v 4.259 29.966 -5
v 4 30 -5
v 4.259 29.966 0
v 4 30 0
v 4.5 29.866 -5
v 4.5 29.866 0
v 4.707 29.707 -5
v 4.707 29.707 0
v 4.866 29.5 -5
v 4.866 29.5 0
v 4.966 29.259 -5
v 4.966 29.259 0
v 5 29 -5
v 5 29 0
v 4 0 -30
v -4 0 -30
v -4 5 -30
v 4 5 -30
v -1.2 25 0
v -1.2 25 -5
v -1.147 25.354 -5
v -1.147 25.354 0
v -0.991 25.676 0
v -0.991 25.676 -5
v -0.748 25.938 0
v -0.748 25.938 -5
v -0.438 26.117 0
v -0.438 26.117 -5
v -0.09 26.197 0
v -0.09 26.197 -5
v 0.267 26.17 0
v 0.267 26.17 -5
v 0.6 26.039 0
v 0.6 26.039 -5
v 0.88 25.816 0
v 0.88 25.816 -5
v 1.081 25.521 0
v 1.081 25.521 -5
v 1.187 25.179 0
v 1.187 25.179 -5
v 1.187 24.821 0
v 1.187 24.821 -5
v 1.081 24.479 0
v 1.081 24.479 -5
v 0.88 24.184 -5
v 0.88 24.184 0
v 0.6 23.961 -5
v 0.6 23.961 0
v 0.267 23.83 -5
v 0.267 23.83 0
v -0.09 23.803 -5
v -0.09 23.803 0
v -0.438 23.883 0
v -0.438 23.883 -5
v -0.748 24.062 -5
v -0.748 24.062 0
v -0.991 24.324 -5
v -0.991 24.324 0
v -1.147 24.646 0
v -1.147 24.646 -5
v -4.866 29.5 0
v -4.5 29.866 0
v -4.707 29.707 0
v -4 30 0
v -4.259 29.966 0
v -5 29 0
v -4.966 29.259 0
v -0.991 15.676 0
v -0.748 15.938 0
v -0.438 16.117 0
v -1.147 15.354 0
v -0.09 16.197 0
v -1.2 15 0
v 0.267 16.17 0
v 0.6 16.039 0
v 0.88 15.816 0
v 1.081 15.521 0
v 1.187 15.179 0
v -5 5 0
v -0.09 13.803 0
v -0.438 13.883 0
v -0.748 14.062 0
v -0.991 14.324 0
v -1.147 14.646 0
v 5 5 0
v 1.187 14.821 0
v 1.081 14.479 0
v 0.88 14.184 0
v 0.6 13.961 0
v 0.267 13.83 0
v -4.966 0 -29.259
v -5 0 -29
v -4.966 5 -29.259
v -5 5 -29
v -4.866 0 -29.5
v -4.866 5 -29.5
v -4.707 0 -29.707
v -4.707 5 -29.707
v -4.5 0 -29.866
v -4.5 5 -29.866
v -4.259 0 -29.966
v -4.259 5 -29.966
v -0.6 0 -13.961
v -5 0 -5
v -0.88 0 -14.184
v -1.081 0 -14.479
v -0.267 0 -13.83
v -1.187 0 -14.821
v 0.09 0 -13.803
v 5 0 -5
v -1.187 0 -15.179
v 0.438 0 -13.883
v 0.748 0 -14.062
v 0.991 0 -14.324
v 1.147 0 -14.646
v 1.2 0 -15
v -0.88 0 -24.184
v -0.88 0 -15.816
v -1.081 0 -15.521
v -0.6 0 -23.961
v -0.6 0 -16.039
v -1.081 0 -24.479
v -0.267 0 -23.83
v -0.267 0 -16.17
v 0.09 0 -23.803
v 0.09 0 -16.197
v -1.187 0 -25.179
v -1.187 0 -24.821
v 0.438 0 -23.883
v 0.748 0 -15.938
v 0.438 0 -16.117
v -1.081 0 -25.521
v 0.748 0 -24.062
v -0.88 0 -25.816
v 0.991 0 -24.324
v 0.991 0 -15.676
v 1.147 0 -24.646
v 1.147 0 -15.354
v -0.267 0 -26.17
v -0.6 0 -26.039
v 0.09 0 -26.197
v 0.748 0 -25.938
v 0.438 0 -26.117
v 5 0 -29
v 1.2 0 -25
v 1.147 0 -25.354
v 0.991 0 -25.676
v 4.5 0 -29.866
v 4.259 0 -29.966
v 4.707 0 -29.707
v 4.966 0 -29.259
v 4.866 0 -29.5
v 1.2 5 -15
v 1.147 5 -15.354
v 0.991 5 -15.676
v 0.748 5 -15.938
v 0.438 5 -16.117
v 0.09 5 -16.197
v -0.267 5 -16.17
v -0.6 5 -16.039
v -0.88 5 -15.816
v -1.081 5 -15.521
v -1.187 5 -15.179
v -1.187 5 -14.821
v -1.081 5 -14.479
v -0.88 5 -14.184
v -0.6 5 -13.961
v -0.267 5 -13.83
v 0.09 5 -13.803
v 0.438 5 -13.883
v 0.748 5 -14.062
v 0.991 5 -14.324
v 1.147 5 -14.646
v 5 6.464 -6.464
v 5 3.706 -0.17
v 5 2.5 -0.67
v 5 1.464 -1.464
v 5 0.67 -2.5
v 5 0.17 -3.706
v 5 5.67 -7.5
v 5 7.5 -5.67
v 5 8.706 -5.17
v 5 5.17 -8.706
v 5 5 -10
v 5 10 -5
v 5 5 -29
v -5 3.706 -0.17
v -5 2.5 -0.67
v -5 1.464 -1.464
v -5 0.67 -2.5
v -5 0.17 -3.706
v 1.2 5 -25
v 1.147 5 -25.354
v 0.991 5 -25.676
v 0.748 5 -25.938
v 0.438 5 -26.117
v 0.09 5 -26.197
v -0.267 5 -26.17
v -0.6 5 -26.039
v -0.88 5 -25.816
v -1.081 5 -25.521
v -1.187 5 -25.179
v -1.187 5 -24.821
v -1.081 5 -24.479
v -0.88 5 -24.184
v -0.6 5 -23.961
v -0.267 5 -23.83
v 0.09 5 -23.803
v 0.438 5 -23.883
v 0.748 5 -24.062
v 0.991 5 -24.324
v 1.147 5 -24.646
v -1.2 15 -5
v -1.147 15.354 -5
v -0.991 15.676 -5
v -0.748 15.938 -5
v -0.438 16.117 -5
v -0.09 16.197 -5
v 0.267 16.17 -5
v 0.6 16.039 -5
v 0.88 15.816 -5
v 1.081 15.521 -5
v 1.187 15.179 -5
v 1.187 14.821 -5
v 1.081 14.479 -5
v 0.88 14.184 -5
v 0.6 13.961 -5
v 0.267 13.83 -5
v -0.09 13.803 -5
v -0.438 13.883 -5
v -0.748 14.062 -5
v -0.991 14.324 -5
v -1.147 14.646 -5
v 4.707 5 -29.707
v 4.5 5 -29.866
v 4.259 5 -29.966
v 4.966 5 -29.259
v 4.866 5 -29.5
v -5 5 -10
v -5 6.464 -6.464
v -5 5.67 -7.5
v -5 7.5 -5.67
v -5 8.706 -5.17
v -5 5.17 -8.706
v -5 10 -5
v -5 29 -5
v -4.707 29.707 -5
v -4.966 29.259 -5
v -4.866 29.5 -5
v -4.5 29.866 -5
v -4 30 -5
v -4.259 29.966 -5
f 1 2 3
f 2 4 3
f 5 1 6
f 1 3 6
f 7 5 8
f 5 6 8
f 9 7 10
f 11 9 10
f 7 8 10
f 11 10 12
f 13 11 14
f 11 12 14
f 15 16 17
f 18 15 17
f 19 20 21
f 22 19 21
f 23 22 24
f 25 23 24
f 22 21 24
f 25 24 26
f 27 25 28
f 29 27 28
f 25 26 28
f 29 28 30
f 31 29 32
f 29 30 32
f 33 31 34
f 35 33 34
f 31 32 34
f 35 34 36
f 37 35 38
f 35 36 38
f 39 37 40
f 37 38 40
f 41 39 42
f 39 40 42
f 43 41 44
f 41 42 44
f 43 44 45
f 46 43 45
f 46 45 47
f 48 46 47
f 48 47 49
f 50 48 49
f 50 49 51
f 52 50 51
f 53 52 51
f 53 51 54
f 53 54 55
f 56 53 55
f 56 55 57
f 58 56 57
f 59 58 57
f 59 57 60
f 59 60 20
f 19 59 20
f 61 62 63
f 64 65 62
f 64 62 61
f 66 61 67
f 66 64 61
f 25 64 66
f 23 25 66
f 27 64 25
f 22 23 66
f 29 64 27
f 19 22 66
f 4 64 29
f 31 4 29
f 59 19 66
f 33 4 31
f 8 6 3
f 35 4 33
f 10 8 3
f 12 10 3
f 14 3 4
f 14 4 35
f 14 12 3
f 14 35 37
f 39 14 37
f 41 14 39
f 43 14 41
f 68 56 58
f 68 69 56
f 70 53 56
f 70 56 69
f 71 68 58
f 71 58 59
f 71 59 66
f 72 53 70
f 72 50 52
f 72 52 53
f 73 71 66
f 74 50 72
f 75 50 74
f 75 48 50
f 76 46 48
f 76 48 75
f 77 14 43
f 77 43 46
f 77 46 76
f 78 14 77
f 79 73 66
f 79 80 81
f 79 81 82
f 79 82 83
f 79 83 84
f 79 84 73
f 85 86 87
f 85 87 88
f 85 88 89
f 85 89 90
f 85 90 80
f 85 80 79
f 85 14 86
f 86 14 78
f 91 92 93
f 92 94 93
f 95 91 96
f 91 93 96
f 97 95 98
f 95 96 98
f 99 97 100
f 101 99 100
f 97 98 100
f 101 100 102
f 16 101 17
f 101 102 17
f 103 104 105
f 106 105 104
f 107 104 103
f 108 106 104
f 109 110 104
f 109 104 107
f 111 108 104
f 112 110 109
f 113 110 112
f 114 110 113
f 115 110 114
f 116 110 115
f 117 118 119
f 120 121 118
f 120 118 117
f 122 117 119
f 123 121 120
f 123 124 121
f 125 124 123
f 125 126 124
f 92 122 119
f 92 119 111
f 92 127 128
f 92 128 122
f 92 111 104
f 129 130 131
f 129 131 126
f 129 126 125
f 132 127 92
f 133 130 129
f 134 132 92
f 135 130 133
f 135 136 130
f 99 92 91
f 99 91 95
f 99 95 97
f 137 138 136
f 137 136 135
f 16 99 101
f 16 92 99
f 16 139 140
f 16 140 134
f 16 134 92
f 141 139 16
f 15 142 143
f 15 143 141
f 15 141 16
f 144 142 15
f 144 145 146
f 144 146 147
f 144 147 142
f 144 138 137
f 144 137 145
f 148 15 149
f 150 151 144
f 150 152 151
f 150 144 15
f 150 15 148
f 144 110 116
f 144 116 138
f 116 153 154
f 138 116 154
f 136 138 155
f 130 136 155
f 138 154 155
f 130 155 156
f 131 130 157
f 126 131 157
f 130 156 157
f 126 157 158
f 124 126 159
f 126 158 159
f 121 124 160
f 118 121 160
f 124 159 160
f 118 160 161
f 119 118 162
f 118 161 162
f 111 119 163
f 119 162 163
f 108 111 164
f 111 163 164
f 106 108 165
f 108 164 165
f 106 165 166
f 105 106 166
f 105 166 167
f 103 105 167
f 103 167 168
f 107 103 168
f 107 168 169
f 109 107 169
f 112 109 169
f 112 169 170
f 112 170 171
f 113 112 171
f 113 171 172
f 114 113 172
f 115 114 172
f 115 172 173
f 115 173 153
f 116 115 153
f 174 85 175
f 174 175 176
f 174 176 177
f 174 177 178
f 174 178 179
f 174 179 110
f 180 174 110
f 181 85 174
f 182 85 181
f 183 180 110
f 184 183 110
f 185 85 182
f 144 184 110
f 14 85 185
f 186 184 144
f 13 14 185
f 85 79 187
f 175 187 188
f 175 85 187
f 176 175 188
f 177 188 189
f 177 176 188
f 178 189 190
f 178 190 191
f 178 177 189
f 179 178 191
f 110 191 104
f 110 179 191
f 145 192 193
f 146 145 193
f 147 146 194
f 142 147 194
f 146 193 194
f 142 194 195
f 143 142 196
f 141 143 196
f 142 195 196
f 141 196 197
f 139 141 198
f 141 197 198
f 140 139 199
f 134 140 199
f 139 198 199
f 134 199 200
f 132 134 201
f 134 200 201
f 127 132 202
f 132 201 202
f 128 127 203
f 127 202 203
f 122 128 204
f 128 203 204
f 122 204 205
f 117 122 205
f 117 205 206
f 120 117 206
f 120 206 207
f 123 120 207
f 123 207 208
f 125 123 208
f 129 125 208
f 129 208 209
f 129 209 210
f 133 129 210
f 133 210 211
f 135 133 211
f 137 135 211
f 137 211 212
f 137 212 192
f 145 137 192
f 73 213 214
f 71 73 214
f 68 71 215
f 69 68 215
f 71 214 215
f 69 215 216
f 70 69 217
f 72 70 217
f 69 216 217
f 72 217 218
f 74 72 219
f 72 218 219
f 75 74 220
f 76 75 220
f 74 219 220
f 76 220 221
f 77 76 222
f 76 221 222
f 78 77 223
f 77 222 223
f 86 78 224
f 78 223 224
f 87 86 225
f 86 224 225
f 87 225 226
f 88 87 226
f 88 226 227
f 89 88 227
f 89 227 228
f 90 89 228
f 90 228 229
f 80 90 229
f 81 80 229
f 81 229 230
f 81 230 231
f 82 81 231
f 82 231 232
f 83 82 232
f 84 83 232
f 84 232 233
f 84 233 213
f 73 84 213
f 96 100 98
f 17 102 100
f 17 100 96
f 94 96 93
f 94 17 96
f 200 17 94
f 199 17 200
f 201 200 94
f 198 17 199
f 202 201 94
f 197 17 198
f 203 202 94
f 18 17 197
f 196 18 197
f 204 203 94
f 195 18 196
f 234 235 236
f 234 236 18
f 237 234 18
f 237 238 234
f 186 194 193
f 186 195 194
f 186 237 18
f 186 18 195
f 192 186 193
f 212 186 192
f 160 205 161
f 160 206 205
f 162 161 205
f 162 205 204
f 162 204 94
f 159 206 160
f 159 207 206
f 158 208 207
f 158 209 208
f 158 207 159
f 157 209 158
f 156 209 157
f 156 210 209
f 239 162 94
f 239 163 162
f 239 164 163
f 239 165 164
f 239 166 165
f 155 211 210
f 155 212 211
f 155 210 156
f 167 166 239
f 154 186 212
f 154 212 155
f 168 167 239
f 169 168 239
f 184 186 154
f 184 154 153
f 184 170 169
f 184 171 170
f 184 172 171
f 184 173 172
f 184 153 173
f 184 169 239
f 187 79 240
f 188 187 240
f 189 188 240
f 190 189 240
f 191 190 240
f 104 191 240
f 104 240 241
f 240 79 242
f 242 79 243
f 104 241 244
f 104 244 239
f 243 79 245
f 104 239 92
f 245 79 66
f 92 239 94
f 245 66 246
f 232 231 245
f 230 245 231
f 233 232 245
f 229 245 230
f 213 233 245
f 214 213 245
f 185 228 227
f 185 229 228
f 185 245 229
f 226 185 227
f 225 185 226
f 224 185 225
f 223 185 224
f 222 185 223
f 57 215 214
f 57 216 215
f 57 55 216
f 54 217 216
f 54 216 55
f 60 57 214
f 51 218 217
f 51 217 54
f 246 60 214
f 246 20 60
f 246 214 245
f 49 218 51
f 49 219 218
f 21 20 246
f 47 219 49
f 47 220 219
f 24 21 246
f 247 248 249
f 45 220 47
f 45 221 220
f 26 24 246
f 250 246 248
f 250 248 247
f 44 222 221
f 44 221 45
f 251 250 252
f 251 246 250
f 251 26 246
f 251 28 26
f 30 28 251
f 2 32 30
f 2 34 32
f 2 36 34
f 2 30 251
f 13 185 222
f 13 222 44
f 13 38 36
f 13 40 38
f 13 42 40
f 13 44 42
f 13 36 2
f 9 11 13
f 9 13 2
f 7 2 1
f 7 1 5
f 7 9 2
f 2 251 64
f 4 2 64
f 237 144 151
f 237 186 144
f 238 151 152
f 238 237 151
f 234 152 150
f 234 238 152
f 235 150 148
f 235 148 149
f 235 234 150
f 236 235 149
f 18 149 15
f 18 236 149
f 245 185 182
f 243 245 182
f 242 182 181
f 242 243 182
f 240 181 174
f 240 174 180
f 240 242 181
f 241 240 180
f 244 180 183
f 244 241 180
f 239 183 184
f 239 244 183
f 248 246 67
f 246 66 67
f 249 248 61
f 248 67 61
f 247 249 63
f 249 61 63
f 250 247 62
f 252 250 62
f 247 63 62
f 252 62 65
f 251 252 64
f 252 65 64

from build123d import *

# Parameters (mm, degrees)
EXTRUDE_1_DEPTH      = 5
EXTRUDE_1_DEPTH_BACK = 5
SKETCH_2_R           = 1.2
CUT_EXTRUDE_1_DEPTH  = 40.37003937
SKETCH_3_R           = 1.2
CUT_EXTRUDE_2_DEPTH  = 40.37003937
FILLET_1_R           = 1
FILLET_2_R           = 5


with BuildPart() as part:
    # Эскиз1 → Бобышка-Вытянуть1 (new, two sides: drawn at the far end of the back side and taken through both)
    with BuildSketch(Plane(origin=(0, 0, 0), x_dir=(0, 0, -1), z_dir=(1, 0, 0)).offset(-EXTRUDE_1_DEPTH_BACK)):
        Polygon((0, 30), (0, 0), (30, 0), (30, 5), (5, 5), (5, 30), align=None)
    extrude(amount=EXTRUDE_1_DEPTH + EXTRUDE_1_DEPTH_BACK)

    # Эскиз2 → Вырез-Вытянуть1 (cut, through all)
    with BuildSketch(Plane(origin=(0, 5, 0), x_dir=(1, 0, 0), z_dir=(0, 1, 0))):
        with Locations((0, 25)):
            Circle(SKETCH_2_R)
        with Locations((0, 15)):
            Circle(SKETCH_2_R)
    extrude(amount=-CUT_EXTRUDE_1_DEPTH, mode=Mode.SUBTRACT)

    # Эскиз3 → Вырез-Вытянуть2 (cut, through all)
    with BuildSketch(Plane(origin=(0, 0, -5), x_dir=(-1, 0, 0), z_dir=(0, 0, -1))):
        with Locations((0, 25)):
            Circle(SKETCH_3_R)
        with Locations((0, 15)):
            Circle(SKETCH_3_R)
    extrude(amount=-CUT_EXTRUDE_2_DEPTH, mode=Mode.SUBTRACT)

    # Скругление1
    fillet_1_edges = [part.edges().sort_by_distance(p)[0] for p in [
        (-5, 2.5, -30),
        (5, 2.5, -30),
        (5, 30, -2.5),
        (-5, 30, -2.5),
    ]]
    fillet(fillet_1_edges, radius=FILLET_1_R)

    # Скругление2
    fillet_2_edges = [part.edges().sort_by_distance(p)[0] for p in [
        (0, 0, 0),
        (0, 5, -5),
    ]]
    fillet(fillet_2_edges, radius=FILLET_2_R)


solid = part.part
